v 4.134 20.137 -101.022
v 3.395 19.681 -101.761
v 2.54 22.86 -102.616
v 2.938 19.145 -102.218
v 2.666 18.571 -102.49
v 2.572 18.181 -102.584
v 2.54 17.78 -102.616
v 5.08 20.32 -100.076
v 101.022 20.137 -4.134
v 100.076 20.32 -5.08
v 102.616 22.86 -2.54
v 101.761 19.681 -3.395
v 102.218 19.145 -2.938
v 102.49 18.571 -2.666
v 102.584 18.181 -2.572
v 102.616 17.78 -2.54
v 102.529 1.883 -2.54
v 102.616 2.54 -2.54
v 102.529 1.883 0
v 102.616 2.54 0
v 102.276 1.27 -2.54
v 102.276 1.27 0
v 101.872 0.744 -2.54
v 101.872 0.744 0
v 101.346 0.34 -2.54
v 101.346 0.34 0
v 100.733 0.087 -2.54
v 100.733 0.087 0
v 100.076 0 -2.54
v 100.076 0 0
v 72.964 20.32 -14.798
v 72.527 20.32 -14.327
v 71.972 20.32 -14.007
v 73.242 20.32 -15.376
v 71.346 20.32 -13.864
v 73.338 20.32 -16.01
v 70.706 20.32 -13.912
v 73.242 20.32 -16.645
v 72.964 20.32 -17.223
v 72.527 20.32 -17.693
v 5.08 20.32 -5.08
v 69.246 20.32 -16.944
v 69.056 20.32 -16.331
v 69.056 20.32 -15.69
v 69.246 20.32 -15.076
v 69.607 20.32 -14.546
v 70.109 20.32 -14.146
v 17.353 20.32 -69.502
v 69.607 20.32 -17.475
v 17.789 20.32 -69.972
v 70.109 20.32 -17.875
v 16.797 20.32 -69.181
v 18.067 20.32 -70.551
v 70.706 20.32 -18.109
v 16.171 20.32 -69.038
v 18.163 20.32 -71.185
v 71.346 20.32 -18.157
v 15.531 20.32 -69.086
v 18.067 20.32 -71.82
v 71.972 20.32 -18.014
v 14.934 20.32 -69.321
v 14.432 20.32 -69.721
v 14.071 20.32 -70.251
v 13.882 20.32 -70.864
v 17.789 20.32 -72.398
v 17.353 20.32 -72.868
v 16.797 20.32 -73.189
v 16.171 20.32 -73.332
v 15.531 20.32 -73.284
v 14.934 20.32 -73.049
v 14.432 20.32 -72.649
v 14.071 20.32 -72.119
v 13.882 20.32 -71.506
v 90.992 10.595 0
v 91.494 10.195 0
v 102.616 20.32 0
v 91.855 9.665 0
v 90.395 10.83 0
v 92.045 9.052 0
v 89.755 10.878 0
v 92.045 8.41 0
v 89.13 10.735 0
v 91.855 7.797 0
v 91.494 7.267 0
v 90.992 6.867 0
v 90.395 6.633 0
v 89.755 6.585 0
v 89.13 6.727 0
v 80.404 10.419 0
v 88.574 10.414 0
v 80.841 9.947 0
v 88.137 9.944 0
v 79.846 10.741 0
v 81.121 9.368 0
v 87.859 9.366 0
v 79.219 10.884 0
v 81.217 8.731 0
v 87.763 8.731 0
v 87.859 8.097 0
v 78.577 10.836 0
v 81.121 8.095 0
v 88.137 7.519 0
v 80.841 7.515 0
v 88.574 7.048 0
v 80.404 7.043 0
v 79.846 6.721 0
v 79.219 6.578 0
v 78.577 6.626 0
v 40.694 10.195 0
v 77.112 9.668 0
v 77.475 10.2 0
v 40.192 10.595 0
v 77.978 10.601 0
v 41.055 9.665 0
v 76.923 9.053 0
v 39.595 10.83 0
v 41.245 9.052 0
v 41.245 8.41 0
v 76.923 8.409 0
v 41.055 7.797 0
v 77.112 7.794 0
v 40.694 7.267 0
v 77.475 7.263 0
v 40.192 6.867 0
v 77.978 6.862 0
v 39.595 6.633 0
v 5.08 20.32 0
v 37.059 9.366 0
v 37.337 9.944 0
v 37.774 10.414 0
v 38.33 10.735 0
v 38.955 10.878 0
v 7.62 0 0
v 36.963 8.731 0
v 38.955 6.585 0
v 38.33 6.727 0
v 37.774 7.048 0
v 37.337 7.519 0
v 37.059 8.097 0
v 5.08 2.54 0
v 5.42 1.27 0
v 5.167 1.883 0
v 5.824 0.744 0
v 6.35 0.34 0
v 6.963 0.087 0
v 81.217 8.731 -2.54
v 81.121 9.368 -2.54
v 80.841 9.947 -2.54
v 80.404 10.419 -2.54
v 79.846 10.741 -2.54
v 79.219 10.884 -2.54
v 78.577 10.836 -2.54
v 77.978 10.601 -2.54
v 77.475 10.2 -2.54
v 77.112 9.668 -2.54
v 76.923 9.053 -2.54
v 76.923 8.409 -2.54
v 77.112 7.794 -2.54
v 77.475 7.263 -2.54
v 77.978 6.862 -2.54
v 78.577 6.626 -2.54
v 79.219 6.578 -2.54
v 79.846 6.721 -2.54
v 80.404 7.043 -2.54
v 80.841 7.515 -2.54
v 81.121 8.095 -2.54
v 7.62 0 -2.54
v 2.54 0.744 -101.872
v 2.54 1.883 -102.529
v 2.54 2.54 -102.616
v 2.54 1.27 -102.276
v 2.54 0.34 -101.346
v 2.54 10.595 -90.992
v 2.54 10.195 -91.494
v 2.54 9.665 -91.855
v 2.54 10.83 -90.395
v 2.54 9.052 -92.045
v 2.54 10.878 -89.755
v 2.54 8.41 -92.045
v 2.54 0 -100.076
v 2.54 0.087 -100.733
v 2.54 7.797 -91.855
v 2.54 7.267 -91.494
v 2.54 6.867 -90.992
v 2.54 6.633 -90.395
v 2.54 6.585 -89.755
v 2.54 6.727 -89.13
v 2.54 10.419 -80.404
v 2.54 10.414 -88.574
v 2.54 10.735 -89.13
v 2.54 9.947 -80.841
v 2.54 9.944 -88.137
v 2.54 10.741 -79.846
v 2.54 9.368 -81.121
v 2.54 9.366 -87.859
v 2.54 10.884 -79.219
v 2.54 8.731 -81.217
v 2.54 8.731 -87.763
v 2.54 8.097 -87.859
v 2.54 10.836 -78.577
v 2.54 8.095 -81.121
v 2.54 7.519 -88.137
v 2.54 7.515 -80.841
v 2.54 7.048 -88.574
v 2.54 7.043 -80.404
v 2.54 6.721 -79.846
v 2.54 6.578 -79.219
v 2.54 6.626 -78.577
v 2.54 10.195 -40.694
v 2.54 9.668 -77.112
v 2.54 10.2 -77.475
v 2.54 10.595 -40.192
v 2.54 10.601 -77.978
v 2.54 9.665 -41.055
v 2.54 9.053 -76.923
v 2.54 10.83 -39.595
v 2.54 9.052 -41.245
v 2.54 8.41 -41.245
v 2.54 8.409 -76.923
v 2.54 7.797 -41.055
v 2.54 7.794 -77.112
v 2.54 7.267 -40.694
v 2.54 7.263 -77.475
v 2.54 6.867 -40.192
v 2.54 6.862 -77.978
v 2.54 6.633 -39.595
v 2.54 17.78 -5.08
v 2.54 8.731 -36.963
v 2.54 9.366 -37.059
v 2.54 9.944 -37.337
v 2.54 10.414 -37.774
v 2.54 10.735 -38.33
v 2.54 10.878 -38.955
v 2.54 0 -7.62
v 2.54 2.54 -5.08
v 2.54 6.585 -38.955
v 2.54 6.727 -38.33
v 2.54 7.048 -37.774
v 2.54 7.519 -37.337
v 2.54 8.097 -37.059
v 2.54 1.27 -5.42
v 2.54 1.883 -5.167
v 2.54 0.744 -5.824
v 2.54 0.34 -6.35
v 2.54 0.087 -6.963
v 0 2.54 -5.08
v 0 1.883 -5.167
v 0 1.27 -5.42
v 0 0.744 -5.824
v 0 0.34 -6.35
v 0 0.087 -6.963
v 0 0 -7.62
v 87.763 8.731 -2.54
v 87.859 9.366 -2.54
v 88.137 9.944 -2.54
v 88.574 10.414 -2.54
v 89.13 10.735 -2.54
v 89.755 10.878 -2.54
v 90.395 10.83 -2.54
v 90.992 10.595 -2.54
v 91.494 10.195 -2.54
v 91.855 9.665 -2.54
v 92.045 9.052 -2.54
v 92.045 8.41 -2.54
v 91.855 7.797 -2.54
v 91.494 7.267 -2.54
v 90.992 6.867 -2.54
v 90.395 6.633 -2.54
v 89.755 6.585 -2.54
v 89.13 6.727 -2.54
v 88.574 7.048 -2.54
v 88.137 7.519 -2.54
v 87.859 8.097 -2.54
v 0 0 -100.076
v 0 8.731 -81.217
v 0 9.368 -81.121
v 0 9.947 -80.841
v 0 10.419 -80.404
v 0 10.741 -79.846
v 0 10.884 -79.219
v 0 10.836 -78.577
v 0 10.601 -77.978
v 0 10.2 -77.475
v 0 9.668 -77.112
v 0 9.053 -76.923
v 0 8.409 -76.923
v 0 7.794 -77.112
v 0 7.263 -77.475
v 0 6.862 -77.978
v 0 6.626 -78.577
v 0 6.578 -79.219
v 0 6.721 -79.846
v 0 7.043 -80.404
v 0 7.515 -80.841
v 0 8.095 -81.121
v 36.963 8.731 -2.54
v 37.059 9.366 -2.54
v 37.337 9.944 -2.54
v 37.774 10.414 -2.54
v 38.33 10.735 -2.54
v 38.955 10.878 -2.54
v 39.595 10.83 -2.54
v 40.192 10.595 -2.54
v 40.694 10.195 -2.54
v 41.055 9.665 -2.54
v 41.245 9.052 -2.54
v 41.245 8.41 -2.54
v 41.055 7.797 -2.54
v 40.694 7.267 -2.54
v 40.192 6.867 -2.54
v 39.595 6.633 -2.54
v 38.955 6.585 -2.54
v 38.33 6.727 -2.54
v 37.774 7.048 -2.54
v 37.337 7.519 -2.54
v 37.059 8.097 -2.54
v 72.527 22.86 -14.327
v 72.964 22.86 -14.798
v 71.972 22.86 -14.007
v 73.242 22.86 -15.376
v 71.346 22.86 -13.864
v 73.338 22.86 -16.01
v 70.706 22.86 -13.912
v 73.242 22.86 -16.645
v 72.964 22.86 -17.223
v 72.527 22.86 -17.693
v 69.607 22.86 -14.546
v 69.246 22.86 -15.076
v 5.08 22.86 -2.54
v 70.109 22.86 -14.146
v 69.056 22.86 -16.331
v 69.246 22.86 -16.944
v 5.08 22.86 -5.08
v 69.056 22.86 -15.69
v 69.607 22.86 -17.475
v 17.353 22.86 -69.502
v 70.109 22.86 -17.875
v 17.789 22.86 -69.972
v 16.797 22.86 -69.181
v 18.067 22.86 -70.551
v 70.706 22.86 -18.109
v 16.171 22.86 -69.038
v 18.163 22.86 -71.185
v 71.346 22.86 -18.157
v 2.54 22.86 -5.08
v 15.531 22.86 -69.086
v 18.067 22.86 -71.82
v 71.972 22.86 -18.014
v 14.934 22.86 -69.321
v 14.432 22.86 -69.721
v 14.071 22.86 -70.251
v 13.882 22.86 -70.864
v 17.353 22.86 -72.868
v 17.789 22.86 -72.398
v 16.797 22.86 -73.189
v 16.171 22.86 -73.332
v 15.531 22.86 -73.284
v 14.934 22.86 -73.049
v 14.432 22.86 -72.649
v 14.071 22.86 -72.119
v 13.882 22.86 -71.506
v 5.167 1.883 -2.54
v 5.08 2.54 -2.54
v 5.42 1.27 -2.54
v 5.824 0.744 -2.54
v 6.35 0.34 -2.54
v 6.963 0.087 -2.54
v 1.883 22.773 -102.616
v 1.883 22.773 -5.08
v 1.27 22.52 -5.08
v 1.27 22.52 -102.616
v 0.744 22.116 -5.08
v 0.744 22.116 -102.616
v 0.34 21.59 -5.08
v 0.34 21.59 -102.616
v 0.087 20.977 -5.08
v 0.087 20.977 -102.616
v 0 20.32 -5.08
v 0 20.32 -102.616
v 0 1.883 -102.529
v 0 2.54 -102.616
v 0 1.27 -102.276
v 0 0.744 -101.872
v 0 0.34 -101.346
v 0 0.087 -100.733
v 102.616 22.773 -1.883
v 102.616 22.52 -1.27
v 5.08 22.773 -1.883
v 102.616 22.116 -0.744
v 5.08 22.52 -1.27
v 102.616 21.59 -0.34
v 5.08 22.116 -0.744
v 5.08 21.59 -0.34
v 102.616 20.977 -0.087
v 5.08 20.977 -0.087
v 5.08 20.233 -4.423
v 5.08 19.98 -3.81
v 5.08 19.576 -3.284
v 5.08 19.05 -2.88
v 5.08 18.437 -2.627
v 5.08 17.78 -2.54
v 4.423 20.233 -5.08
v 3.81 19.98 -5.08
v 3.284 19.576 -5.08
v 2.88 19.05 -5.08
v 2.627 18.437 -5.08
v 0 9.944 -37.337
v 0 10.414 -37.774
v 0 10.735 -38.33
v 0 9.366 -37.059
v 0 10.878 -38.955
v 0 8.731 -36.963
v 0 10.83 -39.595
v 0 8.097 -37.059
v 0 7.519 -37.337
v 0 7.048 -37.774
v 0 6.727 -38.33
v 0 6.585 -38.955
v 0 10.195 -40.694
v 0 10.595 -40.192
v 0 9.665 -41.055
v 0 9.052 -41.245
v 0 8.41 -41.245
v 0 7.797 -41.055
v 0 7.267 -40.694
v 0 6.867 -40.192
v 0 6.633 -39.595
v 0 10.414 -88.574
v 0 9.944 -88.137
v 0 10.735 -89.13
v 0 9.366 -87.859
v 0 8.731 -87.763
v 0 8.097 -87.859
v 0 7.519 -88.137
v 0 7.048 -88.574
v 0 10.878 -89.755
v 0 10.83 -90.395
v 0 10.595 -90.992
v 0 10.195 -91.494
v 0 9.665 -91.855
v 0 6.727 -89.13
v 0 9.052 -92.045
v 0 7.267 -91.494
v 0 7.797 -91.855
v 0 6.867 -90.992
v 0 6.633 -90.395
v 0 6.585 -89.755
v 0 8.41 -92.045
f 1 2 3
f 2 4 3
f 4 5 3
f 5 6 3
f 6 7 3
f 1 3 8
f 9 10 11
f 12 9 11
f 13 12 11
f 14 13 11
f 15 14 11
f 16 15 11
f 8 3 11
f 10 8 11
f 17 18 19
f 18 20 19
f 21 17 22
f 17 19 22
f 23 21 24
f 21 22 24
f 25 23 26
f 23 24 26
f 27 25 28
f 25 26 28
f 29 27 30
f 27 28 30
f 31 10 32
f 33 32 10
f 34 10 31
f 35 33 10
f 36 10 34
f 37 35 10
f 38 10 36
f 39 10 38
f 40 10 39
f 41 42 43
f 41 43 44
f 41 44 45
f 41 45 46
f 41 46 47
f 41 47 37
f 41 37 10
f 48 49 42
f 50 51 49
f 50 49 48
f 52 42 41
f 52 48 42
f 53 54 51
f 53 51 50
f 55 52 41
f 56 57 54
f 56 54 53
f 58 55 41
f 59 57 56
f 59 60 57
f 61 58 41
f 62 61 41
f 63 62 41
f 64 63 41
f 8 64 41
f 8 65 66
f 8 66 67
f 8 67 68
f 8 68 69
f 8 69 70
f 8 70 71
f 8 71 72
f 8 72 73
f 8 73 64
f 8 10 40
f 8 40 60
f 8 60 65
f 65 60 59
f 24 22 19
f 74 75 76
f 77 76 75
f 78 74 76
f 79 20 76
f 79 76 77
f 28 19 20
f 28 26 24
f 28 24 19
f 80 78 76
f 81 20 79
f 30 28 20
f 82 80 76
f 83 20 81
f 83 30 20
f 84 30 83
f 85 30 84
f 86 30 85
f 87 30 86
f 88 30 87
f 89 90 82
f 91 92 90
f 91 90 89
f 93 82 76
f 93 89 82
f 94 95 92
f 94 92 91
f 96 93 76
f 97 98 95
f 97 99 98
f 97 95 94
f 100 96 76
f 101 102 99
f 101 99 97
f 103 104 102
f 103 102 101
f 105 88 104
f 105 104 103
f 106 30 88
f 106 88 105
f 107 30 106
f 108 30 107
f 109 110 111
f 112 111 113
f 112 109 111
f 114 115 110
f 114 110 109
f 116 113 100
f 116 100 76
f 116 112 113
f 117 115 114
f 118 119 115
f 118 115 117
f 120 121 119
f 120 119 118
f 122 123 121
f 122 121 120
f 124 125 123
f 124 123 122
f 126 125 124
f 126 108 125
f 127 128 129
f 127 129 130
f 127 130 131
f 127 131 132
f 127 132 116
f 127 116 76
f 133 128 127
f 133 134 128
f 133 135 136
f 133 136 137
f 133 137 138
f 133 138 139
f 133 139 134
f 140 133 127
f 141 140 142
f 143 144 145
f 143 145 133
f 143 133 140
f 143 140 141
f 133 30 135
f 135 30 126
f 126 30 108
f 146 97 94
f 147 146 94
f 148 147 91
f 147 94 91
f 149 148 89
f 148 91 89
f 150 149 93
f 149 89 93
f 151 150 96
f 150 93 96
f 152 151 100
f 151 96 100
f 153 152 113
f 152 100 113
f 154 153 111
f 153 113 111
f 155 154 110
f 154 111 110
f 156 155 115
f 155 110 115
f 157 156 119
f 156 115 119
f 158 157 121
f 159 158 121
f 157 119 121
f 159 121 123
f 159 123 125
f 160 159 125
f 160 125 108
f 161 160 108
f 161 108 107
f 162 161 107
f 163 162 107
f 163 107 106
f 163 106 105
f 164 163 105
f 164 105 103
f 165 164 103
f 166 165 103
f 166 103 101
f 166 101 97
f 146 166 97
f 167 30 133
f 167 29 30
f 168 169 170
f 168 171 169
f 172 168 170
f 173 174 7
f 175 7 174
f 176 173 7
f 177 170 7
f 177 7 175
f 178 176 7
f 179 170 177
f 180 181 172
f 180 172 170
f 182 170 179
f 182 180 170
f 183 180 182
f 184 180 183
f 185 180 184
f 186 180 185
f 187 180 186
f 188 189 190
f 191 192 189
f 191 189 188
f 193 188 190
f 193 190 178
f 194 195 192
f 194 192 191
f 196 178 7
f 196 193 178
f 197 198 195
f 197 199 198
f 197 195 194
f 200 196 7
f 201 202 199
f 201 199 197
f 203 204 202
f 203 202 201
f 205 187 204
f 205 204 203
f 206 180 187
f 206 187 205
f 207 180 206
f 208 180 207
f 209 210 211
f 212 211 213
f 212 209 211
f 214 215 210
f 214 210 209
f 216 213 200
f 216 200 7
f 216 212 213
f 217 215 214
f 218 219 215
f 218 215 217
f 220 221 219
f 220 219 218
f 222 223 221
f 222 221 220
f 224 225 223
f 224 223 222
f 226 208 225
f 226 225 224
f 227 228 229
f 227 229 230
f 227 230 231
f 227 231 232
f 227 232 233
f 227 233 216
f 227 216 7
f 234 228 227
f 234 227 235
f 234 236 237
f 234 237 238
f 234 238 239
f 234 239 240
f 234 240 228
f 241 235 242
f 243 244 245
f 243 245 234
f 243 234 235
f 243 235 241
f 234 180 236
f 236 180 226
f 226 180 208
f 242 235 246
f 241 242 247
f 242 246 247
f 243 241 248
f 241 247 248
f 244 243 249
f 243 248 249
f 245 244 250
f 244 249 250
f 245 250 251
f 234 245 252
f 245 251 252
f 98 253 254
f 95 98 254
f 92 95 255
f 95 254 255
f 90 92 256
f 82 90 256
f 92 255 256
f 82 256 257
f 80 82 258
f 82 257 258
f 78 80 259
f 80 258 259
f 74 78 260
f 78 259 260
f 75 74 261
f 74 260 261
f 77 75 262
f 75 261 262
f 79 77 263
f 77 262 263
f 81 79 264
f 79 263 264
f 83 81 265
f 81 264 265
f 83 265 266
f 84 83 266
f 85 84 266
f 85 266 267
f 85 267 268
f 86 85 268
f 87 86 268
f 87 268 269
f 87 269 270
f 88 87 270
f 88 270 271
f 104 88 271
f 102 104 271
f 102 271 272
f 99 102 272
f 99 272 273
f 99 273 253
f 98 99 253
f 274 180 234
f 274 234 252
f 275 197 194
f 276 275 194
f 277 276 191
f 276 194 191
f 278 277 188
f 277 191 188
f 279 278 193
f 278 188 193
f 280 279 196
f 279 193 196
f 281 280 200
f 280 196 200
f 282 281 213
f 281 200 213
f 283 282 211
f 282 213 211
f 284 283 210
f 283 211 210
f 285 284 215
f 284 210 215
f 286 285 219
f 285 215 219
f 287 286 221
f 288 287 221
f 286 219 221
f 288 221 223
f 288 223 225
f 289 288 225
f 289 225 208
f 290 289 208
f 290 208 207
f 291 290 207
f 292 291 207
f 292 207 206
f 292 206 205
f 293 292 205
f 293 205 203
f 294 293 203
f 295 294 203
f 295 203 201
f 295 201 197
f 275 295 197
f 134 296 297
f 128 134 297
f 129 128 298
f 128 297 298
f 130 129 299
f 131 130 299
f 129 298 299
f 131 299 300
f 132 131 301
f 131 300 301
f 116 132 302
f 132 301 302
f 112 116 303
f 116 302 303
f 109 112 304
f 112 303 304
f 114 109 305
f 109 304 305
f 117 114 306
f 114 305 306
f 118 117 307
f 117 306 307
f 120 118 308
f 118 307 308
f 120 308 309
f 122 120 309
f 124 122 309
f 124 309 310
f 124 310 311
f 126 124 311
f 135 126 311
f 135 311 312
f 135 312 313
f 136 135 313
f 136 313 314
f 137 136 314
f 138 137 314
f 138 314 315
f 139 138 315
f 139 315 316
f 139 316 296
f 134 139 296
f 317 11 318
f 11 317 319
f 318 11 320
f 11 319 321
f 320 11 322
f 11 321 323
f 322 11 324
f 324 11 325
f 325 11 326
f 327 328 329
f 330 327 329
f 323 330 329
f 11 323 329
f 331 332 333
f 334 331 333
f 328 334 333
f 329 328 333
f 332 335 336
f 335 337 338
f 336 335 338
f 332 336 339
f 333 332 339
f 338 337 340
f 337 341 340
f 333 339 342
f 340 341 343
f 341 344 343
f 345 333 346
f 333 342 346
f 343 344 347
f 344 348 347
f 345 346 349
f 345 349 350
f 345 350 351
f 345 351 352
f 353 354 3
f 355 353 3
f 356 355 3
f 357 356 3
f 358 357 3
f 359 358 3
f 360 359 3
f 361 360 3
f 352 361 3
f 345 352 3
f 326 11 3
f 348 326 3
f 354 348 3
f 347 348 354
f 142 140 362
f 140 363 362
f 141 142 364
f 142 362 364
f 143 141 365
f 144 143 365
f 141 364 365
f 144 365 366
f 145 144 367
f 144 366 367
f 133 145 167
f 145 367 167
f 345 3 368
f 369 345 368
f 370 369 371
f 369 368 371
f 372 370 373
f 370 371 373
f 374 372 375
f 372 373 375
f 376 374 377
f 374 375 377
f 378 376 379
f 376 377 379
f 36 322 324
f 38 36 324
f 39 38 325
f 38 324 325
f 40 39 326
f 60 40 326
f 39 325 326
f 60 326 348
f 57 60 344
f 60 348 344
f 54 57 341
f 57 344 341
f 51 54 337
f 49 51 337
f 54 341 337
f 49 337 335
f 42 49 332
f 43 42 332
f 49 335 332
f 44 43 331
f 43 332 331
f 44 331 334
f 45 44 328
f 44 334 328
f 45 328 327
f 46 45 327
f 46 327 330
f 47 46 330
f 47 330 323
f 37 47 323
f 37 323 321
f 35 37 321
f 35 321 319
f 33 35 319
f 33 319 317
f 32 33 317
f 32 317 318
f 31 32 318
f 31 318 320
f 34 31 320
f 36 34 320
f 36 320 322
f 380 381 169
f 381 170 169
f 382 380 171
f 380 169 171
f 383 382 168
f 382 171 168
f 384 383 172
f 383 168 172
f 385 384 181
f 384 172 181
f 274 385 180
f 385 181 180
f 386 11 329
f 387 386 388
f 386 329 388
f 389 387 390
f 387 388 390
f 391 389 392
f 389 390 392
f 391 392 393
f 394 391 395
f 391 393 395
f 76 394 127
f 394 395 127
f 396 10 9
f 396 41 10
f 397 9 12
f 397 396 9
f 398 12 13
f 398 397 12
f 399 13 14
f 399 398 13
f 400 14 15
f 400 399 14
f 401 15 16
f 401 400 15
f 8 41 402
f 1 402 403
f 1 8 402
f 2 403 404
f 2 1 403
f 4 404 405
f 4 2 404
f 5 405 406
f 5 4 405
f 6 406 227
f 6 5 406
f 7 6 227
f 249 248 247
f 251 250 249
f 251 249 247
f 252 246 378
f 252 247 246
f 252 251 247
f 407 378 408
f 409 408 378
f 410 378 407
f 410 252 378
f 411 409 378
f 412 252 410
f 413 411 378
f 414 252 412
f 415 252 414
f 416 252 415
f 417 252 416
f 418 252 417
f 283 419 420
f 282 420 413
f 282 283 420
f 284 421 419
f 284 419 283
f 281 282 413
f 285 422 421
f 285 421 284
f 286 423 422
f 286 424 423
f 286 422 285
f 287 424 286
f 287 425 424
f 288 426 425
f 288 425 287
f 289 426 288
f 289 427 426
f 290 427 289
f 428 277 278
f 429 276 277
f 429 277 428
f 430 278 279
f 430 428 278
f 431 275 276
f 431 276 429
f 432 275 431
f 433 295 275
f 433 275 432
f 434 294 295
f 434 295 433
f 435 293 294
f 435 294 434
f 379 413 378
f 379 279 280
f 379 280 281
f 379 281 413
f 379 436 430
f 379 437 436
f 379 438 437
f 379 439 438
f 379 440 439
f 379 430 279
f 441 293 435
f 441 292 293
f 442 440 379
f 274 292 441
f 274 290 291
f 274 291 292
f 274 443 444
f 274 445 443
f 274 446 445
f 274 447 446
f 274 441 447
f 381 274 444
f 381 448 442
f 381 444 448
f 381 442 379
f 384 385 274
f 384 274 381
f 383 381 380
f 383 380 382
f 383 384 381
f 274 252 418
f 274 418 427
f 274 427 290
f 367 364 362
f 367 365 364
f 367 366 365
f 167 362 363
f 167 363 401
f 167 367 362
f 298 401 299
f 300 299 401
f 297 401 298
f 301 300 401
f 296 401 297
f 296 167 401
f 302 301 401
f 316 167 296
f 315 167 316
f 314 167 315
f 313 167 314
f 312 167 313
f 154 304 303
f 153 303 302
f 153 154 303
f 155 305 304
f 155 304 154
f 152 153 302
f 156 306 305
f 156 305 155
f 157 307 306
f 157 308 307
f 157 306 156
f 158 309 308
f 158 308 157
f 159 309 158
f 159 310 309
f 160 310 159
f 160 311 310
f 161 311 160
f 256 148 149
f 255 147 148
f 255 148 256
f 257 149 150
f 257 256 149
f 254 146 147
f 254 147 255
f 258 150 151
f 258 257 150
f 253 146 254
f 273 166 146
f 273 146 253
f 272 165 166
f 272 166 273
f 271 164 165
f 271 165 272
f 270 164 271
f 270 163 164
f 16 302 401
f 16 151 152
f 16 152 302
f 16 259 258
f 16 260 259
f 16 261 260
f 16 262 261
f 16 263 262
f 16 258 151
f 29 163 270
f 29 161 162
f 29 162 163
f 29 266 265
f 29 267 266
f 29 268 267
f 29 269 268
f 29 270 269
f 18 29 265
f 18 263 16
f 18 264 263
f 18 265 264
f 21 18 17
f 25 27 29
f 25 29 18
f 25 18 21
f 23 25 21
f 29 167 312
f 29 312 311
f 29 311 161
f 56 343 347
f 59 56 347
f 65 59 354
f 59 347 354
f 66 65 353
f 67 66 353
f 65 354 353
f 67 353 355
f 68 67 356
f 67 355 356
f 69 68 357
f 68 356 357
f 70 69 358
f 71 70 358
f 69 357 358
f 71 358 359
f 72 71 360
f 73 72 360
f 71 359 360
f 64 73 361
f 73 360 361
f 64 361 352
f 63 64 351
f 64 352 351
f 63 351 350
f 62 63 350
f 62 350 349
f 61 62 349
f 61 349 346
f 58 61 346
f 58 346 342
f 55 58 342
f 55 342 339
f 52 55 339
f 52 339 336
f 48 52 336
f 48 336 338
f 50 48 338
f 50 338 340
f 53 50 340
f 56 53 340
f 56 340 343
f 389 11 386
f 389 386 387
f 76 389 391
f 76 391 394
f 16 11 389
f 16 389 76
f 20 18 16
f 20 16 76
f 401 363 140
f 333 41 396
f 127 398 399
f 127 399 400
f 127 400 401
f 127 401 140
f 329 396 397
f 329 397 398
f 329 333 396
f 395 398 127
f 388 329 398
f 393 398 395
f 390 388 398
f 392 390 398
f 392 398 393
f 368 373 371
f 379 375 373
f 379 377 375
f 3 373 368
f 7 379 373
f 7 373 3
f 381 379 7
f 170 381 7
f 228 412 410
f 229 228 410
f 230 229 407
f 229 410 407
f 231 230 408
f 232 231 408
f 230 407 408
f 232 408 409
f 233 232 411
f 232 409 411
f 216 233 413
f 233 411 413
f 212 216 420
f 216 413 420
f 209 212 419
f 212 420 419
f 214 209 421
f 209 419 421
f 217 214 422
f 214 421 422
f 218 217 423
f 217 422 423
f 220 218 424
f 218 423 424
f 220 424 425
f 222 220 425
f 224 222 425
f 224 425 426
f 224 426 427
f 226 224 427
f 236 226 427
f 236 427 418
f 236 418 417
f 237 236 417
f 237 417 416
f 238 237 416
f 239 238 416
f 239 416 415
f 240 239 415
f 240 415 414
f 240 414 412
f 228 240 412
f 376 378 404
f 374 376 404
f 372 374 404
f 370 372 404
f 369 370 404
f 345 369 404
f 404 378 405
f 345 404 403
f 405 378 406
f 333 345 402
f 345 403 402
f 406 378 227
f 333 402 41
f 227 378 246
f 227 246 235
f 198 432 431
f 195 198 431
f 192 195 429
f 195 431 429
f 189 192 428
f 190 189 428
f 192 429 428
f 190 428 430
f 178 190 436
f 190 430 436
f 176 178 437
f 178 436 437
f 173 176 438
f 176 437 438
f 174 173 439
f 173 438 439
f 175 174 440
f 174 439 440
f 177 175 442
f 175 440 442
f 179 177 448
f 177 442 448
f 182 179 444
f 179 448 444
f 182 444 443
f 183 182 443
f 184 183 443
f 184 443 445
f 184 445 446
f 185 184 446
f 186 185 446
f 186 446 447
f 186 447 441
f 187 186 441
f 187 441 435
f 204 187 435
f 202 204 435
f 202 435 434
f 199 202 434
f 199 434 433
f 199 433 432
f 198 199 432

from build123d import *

# Parameters (mm, degrees)
BOSS_EXTRUDE3_DEPTH       = 22.86
BOSS_EXTRUDE4_DEPTH       = 2.54
FILLET1_R                 = 2.54
SKETCH4_W                 = 8.004359919
SKETCH4_H                 = 7.259840527
CUT_EXTRUDE1_DEPTH        = 32.004
CUT_EXTRUDE1_DEPTH_BACK   = 2.54
F_8_CLEARANCE_HOLE1_D     = 4.3053
F_8_CLEARANCE_HOLE1_DEPTH = 74.422
F_8_CLEARANCE_HOLE1_TIP   = 1.293442612
F_8_CLEARANCE_HOLE2_D     = 4.3053
F_8_CLEARANCE_HOLE2_DEPTH = 74.422
F_8_CLEARANCE_HOLE2_TIP   = 1.293442612
F_8_CLEARANCE_HOLE3_D     = 4.3053
F_8_CLEARANCE_HOLE3_DEPTH = 74.422
F_8_CLEARANCE_HOLE3_TIP   = 1.293442612
FILLET2_R                 = 2.54
SKETCH11_R                = 2.159
CUT_EXTRUDE2_DEPTH        = 7.62
SKETCH12_R                = 2.159
CUT_EXTRUDE3_DEPTH        = 7.62


with BuildPart() as part:
    # Sketch1 → Boss-Extrude3 (new body)
    with BuildSketch(Plane(origin=(0, 0, 0), x_dir=(1, 0, 0), z_dir=(0, 1, 0))):
        Polygon((102.616, 2.54), (102.616, 0), (0, 0), (0, 102.616), (2.54, 102.616), (2.54, 2.54), align=None)
    extrude(amount=BOSS_EXTRUDE3_DEPTH)

    # Sketch3 → Boss-Extrude4 (add)
    with BuildSketch(Plane(origin=(0, 22.86, 0), x_dir=(1, 0, 0), z_dir=(0, 1, 0))):
        Polygon((2.54, 102.616), (102.616, 2.54), (2.54, 2.54), align=None)
    extrude(amount=-BOSS_EXTRUDE4_DEPTH)

    # Fillet1
    fillet1_edges = [part.edges().sort_by_distance(p)[0] for p in [
        (0, 22.86, -51.308),
        (51.308, 22.86, 0),
        (2.54, 10.16, -2.54),
        (52.578, 20.32, -2.54),
        (2.54, 20.32, -52.578),
    ]]
    fillet(fillet1_edges, radius=FILLET1_R)

    # Sketch4 → Cut-Extrude1 (cut, two sides)
    with BuildSketch(Plane.XZ.offset(-20.32)) as cut_extrude1_sk:
        with Locations((1.077820041, -1.450079736)):
            Rectangle(SKETCH4_W, SKETCH4_H)
    extrude(amount=CUT_EXTRUDE1_DEPTH, mode=Mode.SUBTRACT)
    extrude(cut_extrude1_sk.sketch, amount=-CUT_EXTRUDE1_DEPTH_BACK, mode=Mode.SUBTRACT)

    # #8 Clearance Hole1
    with Locations(Plane(origin=(2.54, 0, 0), x_dir=(0, 0, -1), z_dir=(1, 0, 0))):
        with Locations((39.116, 8.73125), (89.916, 8.73125)):
            Hole(F_8_CLEARANCE_HOLE1_D / 2, depth=F_8_CLEARANCE_HOLE1_DEPTH)
            with Locations((0, 0, -(F_8_CLEARANCE_HOLE1_DEPTH + F_8_CLEARANCE_HOLE1_TIP / 2))):  # 118° drill point
                Cone(0, F_8_CLEARANCE_HOLE1_D / 2, F_8_CLEARANCE_HOLE1_TIP, mode=Mode.SUBTRACT)

    # #8 Clearance Hole2
    with Locations(Plane.XY):
        with Locations((89.916, 8.73125), (39.116, 8.73125)):
            Hole(F_8_CLEARANCE_HOLE2_D / 2, depth=F_8_CLEARANCE_HOLE2_DEPTH)
            with Locations((0, 0, -(F_8_CLEARANCE_HOLE2_DEPTH + F_8_CLEARANCE_HOLE2_TIP / 2))):  # 118° drill point
                Cone(0, F_8_CLEARANCE_HOLE2_D / 2, F_8_CLEARANCE_HOLE2_TIP, mode=Mode.SUBTRACT)

    # #8 Clearance Hole3
    with Locations(Plane(origin=(0, 20.32, 0), x_dir=(-1, 0, 0), z_dir=(0, -1, 0))):
        with Locations((-16.010384182, 71.185103576), (-71.185103576, 16.010384182)):
            Hole(F_8_CLEARANCE_HOLE3_D / 2, depth=F_8_CLEARANCE_HOLE3_DEPTH)
            with Locations((0, 0, -(F_8_CLEARANCE_HOLE3_DEPTH + F_8_CLEARANCE_HOLE3_TIP / 2))):  # 118° drill point
                Cone(0, F_8_CLEARANCE_HOLE3_D / 2, F_8_CLEARANCE_HOLE3_TIP, mode=Mode.SUBTRACT)

    # Fillet2
    fillet2_edges = [part.edges().sort_by_distance(p)[0] for p in [
        (1.27, 0, -5.08),
        (5.08, 0, -1.27),
        (1.27, 0, -102.616),
        (102.616, 0, -1.27),
    ]]
    fillet(fillet2_edges, radius=FILLET2_R)

    # Sketch11 → Cut-Extrude2 (cut)
    with BuildSketch(Plane(origin=(2.54, 0, 0), x_dir=(0, 0, -1), z_dir=(1, 0, 0))):
        with Locations((79.0575, 8.73125)):
            Circle(SKETCH11_R)
    extrude(amount=-CUT_EXTRUDE2_DEPTH, mode=Mode.SUBTRACT)

    # Sketch12 → Cut-Extrude3 (cut)
    with BuildSketch(Plane.XY):
        with Locations((79.0575, 8.73125)):
            Circle(SKETCH12_R)
    extrude(amount=-CUT_EXTRUDE3_DEPTH, mode=Mode.SUBTRACT)


solid = part.part
